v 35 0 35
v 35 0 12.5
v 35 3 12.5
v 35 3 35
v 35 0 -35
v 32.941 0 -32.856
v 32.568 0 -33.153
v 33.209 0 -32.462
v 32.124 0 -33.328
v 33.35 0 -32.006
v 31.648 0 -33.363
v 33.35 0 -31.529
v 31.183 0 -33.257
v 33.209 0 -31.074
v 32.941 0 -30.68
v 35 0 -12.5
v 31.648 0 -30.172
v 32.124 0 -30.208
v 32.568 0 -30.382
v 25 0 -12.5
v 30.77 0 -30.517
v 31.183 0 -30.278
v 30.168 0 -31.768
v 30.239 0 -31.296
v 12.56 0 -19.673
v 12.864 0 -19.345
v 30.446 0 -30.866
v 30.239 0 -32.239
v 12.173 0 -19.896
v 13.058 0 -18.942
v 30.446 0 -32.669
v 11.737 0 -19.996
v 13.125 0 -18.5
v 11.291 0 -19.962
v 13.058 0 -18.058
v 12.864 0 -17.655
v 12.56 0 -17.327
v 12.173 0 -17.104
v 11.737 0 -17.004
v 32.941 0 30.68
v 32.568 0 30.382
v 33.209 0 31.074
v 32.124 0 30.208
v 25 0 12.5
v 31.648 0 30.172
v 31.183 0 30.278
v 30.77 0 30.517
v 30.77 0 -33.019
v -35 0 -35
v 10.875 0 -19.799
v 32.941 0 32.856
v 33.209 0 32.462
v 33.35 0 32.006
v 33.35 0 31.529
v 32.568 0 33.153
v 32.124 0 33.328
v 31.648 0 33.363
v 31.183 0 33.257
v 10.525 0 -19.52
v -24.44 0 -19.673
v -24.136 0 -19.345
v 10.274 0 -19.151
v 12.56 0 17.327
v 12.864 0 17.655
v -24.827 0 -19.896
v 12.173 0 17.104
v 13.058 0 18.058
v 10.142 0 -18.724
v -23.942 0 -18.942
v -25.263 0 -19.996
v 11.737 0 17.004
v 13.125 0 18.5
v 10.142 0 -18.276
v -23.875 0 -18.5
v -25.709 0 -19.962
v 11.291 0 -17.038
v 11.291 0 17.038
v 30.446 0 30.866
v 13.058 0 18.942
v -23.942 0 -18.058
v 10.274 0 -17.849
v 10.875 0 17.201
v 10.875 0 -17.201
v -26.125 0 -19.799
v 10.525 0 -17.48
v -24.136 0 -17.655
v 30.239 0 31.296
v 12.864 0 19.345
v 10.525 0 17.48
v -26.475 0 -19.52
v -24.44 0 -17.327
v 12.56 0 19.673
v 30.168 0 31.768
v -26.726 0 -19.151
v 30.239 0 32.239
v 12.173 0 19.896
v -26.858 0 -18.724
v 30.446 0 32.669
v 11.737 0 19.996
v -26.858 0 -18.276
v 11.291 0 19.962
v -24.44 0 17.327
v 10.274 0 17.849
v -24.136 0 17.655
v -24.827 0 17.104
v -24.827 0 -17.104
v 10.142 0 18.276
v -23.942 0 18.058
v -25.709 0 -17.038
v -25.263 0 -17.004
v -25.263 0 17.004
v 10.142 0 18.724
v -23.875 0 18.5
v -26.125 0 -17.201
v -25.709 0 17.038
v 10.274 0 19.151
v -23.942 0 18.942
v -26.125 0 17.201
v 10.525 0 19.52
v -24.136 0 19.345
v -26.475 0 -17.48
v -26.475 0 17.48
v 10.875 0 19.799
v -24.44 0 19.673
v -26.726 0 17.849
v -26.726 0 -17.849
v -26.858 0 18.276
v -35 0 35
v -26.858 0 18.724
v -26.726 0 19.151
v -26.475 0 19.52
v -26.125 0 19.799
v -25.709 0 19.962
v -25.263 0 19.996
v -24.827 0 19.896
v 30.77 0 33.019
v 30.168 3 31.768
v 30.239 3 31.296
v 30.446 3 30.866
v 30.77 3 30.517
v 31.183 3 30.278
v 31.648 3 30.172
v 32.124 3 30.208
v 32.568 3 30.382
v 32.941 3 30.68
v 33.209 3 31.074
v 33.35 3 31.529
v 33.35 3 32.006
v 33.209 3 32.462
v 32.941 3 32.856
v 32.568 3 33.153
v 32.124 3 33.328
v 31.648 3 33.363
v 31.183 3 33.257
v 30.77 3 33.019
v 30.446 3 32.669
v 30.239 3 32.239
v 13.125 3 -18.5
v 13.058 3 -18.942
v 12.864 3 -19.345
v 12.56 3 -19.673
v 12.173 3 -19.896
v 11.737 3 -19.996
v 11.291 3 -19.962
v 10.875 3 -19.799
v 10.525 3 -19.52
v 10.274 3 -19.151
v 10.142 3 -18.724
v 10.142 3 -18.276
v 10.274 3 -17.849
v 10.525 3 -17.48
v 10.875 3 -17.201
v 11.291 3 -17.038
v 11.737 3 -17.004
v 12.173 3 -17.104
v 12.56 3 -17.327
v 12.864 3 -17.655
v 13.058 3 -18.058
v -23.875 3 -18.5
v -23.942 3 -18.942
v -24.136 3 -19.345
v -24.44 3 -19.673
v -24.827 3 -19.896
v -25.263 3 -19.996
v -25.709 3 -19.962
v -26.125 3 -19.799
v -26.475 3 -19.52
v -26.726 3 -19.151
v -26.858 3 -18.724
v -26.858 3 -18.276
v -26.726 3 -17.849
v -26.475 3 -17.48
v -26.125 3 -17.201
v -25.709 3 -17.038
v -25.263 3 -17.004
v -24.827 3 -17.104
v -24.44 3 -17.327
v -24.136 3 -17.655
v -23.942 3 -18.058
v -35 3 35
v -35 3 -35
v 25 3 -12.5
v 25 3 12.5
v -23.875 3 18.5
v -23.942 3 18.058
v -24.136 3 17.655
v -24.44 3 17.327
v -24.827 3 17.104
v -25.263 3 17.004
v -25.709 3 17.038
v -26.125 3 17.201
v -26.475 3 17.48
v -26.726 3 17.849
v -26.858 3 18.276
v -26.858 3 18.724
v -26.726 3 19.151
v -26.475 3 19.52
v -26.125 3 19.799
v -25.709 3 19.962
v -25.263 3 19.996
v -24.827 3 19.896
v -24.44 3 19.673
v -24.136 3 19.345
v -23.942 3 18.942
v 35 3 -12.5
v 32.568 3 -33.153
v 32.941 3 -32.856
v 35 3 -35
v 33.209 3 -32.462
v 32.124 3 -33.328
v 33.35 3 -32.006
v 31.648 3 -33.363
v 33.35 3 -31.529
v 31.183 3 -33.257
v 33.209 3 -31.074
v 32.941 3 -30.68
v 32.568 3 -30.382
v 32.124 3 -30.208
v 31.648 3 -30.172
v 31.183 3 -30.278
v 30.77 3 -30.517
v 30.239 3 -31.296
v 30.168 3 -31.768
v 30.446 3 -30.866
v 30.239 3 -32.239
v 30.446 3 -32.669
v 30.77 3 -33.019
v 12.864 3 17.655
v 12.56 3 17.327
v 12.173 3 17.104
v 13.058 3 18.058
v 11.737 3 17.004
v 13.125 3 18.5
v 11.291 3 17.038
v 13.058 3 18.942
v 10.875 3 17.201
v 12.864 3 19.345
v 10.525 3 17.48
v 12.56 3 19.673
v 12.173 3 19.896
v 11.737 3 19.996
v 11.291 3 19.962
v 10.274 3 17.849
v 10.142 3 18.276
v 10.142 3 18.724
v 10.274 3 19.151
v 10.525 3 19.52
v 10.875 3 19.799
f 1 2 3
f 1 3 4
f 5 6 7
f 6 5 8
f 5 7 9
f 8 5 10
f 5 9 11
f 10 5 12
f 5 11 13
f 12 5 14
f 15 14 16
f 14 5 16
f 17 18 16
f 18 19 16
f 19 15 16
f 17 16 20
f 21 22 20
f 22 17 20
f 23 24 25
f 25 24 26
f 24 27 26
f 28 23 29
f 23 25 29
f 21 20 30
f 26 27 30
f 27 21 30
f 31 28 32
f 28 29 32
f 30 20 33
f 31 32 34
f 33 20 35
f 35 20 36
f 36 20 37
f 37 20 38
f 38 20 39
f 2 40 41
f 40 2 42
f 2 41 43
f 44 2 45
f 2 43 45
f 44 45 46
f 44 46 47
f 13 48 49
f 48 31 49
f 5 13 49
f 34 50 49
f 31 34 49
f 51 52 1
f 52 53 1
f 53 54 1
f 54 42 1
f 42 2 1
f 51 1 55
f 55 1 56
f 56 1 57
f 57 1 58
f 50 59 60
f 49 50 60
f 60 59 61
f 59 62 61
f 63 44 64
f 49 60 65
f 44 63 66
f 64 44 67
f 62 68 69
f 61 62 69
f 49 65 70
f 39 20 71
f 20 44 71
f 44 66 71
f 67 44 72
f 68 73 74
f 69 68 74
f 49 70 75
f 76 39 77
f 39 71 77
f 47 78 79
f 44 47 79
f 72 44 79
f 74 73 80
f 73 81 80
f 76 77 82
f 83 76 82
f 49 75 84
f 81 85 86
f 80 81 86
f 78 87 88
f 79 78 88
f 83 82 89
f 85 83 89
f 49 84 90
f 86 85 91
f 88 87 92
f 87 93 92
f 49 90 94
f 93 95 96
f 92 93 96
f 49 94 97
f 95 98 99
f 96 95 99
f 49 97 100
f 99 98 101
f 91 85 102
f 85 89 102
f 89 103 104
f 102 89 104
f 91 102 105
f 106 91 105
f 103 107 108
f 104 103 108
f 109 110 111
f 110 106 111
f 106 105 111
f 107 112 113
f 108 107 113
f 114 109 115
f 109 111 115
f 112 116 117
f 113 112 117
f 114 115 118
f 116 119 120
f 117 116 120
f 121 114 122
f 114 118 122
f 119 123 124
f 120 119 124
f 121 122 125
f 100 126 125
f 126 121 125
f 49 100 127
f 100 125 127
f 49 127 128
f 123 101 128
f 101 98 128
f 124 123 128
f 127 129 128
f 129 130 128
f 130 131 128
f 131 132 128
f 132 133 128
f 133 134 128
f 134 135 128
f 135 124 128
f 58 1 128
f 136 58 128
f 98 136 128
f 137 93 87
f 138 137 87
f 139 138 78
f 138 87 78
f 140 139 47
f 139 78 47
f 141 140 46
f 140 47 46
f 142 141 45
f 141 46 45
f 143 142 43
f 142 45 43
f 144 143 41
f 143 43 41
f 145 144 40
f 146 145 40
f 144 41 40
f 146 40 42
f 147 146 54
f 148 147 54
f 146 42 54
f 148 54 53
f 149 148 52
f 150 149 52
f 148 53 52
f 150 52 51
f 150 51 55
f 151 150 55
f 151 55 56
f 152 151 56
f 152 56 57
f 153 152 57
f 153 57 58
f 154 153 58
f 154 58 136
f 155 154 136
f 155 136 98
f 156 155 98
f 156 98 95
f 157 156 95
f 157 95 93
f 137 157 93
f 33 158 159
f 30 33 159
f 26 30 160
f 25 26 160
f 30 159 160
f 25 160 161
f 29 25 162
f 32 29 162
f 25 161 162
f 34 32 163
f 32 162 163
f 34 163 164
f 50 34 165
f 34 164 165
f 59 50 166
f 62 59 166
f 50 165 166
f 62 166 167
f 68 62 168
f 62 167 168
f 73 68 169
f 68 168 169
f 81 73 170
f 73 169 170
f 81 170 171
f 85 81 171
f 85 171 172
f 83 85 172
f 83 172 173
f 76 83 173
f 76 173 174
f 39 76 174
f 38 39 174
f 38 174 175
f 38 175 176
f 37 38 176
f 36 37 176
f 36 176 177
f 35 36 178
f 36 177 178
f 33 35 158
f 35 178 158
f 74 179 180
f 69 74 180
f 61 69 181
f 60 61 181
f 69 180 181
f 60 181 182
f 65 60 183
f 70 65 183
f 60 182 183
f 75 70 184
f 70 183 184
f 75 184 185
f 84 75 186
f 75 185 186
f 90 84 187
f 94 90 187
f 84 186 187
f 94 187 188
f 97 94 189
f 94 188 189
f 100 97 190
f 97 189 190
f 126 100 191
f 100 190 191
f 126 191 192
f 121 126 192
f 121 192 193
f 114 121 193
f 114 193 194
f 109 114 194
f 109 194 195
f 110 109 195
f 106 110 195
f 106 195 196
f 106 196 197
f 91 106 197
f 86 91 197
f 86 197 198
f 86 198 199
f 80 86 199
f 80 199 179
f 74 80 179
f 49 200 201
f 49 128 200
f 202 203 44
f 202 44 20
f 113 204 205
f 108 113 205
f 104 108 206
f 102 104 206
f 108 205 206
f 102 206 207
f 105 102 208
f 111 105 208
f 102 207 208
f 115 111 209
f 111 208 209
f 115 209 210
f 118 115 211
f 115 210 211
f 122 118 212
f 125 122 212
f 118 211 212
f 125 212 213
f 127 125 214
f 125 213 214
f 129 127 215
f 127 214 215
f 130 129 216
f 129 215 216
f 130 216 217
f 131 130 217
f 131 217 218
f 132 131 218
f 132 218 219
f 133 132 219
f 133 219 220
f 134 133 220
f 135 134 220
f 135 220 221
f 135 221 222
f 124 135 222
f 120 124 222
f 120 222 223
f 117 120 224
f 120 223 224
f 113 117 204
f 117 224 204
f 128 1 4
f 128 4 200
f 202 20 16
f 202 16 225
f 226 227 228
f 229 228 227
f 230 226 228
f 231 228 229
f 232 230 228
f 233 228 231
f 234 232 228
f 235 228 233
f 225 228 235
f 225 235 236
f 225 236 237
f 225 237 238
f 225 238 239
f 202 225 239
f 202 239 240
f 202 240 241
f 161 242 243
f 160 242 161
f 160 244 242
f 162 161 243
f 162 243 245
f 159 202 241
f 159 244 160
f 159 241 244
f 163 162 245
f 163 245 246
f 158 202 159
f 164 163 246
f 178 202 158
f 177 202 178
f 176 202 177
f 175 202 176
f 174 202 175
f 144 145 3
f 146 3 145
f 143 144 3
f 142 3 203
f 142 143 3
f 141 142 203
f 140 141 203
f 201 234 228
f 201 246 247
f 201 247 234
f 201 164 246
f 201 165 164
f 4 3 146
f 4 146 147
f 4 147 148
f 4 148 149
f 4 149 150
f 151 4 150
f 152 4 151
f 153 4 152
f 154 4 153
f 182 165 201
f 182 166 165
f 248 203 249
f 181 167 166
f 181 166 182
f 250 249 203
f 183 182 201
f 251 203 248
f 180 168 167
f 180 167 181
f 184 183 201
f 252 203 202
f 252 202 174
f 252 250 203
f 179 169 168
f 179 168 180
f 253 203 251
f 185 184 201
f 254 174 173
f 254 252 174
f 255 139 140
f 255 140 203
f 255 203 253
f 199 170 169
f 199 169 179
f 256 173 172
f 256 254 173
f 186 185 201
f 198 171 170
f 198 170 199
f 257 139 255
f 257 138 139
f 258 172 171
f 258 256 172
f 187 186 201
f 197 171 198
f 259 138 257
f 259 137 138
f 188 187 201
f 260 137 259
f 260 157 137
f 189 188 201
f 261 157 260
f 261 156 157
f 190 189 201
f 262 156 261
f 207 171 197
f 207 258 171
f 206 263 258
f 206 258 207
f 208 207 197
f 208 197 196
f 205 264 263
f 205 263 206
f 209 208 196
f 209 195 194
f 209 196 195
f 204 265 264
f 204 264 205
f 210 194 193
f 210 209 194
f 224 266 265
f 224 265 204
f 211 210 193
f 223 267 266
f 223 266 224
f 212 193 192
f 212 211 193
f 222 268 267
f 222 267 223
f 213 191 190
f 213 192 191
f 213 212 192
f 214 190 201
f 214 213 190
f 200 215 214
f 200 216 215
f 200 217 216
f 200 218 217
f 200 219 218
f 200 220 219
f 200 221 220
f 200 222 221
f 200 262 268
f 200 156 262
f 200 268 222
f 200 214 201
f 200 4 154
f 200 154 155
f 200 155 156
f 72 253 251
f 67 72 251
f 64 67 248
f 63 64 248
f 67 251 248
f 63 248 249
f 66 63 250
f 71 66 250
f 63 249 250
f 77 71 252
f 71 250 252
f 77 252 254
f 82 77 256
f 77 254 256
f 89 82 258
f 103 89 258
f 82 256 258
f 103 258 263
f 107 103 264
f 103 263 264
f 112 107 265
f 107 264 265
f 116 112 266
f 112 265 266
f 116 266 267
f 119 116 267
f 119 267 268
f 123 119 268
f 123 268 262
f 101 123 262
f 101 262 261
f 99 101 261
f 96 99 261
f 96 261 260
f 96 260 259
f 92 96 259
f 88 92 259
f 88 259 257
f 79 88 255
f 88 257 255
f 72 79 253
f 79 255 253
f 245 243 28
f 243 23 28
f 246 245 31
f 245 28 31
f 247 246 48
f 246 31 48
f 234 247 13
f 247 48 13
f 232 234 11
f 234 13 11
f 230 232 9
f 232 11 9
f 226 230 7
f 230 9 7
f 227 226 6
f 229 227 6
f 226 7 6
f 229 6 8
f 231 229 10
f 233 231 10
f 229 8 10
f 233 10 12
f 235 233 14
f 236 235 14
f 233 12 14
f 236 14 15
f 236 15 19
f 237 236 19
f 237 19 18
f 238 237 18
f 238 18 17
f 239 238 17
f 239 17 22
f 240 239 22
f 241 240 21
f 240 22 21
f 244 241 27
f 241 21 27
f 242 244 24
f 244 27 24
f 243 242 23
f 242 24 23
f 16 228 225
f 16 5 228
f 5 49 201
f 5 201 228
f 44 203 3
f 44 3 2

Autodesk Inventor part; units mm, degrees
ref_plane "YZ Plane" through (0, 0, 0) normal (1, 0, 0) x (0, 1, 0)
ref_plane "XZ Plane" through (0, 0, 0) normal (0, 1, 0) x (-1, 0, 0)
ref_plane "XY Plane" through (0, 0, 0) normal (0, 0, 1) x (1, 0, 0)
sketch "Эскиз1" plane through (0, 0, 0) normal (0, 1, 0) x (-1, 0, 0)
  line L0 (-35, 35) -> (35, 35)
  line L1 (35, 35) -> (35, -35)
  line L2 (35, -35) -> (-35, -35)
  line L3 (-35, -35) -> (-35, 35)
  line L4 (-35, 35) -> (35, -35) construction
  line L5 (35, 35) -> (-35, -35) construction
  line L6 (-35, 35) -> (-31.7678, 31.7678)
  circle A0 centre (-31.7678, 31.7678) radius 1.6
  line L7 (-35, -35) -> (-31.7678, -31.7678)
  circle A1 centre (-31.7678, -31.7678) radius 1.6
  point P0 (0, 0)
  dimension "d0" = 70
  dimension "d1" = 70
  dimension "d2" = 4.571
  dimension "d3" = 3.2
  dimension "d4" = 4.571
  dimension "d5" = 3.2
extrude "Выдавливание1" add sketch "Эскиз1" along normal blind 3
sketch "Эскиз2" plane through (35, 0, 35) normal (1, 0, 0) x (0, 0, -1)
  line L0 (35, 0) -> (35, 3)
  line L1 (0, 3) -> (70, 3) projected
  line L2 (22.5, 0) -> (47.5, 0)
  line L3 (47.5, 0) -> (47.5, 3)
  line L4 (47.5, 3) -> (22.5, 3)
  line L5 (22.5, 3) -> (22.5, 0)
  line L6 (22.5, 0) -> (47.5, 3) construction
  line L7 (47.5, 0) -> (22.5, 3) construction
  point P0 (35, 1.5)
  dimension "d8" = 25
extrude "Выдавливание2" cut sketch "Эскиз2" against normal blind 10
sketch "Эскиз3" plane through (0, 3, 0) normal (0, 1, 0) x (1, 0, 0)
  line L0 (-28.375, -21.875) -> (-28.375, 21.875)
  line L1 (14.625, -21.875) -> (-28.375, -21.875)
  line L2 (14.625, 21.875) -> (14.625, -21.875)
  line L3 (-28.375, 21.875) -> (14.625, 21.875)
  circle A0 centre (11.625, -18.5) radius 1.5
  circle A1 centre (-25.375, -18.5) radius 1.5
  circle A2 centre (-25.375, 18.5) radius 1.5
  circle A3 centre (11.625, 18.5) radius 1.5
  point P0 (0, 0)
  point P1 (-6.875, 0)
extrude "Выдавливание3" cut sketch "Эскиз3" against normal blind 10 contours A0 | A1 | A2 | A3
equation "\"d4\" = d2"
equation "\"d5\" = d3"
properties part number "000.107 - Правая стенка среднего сегмента"
